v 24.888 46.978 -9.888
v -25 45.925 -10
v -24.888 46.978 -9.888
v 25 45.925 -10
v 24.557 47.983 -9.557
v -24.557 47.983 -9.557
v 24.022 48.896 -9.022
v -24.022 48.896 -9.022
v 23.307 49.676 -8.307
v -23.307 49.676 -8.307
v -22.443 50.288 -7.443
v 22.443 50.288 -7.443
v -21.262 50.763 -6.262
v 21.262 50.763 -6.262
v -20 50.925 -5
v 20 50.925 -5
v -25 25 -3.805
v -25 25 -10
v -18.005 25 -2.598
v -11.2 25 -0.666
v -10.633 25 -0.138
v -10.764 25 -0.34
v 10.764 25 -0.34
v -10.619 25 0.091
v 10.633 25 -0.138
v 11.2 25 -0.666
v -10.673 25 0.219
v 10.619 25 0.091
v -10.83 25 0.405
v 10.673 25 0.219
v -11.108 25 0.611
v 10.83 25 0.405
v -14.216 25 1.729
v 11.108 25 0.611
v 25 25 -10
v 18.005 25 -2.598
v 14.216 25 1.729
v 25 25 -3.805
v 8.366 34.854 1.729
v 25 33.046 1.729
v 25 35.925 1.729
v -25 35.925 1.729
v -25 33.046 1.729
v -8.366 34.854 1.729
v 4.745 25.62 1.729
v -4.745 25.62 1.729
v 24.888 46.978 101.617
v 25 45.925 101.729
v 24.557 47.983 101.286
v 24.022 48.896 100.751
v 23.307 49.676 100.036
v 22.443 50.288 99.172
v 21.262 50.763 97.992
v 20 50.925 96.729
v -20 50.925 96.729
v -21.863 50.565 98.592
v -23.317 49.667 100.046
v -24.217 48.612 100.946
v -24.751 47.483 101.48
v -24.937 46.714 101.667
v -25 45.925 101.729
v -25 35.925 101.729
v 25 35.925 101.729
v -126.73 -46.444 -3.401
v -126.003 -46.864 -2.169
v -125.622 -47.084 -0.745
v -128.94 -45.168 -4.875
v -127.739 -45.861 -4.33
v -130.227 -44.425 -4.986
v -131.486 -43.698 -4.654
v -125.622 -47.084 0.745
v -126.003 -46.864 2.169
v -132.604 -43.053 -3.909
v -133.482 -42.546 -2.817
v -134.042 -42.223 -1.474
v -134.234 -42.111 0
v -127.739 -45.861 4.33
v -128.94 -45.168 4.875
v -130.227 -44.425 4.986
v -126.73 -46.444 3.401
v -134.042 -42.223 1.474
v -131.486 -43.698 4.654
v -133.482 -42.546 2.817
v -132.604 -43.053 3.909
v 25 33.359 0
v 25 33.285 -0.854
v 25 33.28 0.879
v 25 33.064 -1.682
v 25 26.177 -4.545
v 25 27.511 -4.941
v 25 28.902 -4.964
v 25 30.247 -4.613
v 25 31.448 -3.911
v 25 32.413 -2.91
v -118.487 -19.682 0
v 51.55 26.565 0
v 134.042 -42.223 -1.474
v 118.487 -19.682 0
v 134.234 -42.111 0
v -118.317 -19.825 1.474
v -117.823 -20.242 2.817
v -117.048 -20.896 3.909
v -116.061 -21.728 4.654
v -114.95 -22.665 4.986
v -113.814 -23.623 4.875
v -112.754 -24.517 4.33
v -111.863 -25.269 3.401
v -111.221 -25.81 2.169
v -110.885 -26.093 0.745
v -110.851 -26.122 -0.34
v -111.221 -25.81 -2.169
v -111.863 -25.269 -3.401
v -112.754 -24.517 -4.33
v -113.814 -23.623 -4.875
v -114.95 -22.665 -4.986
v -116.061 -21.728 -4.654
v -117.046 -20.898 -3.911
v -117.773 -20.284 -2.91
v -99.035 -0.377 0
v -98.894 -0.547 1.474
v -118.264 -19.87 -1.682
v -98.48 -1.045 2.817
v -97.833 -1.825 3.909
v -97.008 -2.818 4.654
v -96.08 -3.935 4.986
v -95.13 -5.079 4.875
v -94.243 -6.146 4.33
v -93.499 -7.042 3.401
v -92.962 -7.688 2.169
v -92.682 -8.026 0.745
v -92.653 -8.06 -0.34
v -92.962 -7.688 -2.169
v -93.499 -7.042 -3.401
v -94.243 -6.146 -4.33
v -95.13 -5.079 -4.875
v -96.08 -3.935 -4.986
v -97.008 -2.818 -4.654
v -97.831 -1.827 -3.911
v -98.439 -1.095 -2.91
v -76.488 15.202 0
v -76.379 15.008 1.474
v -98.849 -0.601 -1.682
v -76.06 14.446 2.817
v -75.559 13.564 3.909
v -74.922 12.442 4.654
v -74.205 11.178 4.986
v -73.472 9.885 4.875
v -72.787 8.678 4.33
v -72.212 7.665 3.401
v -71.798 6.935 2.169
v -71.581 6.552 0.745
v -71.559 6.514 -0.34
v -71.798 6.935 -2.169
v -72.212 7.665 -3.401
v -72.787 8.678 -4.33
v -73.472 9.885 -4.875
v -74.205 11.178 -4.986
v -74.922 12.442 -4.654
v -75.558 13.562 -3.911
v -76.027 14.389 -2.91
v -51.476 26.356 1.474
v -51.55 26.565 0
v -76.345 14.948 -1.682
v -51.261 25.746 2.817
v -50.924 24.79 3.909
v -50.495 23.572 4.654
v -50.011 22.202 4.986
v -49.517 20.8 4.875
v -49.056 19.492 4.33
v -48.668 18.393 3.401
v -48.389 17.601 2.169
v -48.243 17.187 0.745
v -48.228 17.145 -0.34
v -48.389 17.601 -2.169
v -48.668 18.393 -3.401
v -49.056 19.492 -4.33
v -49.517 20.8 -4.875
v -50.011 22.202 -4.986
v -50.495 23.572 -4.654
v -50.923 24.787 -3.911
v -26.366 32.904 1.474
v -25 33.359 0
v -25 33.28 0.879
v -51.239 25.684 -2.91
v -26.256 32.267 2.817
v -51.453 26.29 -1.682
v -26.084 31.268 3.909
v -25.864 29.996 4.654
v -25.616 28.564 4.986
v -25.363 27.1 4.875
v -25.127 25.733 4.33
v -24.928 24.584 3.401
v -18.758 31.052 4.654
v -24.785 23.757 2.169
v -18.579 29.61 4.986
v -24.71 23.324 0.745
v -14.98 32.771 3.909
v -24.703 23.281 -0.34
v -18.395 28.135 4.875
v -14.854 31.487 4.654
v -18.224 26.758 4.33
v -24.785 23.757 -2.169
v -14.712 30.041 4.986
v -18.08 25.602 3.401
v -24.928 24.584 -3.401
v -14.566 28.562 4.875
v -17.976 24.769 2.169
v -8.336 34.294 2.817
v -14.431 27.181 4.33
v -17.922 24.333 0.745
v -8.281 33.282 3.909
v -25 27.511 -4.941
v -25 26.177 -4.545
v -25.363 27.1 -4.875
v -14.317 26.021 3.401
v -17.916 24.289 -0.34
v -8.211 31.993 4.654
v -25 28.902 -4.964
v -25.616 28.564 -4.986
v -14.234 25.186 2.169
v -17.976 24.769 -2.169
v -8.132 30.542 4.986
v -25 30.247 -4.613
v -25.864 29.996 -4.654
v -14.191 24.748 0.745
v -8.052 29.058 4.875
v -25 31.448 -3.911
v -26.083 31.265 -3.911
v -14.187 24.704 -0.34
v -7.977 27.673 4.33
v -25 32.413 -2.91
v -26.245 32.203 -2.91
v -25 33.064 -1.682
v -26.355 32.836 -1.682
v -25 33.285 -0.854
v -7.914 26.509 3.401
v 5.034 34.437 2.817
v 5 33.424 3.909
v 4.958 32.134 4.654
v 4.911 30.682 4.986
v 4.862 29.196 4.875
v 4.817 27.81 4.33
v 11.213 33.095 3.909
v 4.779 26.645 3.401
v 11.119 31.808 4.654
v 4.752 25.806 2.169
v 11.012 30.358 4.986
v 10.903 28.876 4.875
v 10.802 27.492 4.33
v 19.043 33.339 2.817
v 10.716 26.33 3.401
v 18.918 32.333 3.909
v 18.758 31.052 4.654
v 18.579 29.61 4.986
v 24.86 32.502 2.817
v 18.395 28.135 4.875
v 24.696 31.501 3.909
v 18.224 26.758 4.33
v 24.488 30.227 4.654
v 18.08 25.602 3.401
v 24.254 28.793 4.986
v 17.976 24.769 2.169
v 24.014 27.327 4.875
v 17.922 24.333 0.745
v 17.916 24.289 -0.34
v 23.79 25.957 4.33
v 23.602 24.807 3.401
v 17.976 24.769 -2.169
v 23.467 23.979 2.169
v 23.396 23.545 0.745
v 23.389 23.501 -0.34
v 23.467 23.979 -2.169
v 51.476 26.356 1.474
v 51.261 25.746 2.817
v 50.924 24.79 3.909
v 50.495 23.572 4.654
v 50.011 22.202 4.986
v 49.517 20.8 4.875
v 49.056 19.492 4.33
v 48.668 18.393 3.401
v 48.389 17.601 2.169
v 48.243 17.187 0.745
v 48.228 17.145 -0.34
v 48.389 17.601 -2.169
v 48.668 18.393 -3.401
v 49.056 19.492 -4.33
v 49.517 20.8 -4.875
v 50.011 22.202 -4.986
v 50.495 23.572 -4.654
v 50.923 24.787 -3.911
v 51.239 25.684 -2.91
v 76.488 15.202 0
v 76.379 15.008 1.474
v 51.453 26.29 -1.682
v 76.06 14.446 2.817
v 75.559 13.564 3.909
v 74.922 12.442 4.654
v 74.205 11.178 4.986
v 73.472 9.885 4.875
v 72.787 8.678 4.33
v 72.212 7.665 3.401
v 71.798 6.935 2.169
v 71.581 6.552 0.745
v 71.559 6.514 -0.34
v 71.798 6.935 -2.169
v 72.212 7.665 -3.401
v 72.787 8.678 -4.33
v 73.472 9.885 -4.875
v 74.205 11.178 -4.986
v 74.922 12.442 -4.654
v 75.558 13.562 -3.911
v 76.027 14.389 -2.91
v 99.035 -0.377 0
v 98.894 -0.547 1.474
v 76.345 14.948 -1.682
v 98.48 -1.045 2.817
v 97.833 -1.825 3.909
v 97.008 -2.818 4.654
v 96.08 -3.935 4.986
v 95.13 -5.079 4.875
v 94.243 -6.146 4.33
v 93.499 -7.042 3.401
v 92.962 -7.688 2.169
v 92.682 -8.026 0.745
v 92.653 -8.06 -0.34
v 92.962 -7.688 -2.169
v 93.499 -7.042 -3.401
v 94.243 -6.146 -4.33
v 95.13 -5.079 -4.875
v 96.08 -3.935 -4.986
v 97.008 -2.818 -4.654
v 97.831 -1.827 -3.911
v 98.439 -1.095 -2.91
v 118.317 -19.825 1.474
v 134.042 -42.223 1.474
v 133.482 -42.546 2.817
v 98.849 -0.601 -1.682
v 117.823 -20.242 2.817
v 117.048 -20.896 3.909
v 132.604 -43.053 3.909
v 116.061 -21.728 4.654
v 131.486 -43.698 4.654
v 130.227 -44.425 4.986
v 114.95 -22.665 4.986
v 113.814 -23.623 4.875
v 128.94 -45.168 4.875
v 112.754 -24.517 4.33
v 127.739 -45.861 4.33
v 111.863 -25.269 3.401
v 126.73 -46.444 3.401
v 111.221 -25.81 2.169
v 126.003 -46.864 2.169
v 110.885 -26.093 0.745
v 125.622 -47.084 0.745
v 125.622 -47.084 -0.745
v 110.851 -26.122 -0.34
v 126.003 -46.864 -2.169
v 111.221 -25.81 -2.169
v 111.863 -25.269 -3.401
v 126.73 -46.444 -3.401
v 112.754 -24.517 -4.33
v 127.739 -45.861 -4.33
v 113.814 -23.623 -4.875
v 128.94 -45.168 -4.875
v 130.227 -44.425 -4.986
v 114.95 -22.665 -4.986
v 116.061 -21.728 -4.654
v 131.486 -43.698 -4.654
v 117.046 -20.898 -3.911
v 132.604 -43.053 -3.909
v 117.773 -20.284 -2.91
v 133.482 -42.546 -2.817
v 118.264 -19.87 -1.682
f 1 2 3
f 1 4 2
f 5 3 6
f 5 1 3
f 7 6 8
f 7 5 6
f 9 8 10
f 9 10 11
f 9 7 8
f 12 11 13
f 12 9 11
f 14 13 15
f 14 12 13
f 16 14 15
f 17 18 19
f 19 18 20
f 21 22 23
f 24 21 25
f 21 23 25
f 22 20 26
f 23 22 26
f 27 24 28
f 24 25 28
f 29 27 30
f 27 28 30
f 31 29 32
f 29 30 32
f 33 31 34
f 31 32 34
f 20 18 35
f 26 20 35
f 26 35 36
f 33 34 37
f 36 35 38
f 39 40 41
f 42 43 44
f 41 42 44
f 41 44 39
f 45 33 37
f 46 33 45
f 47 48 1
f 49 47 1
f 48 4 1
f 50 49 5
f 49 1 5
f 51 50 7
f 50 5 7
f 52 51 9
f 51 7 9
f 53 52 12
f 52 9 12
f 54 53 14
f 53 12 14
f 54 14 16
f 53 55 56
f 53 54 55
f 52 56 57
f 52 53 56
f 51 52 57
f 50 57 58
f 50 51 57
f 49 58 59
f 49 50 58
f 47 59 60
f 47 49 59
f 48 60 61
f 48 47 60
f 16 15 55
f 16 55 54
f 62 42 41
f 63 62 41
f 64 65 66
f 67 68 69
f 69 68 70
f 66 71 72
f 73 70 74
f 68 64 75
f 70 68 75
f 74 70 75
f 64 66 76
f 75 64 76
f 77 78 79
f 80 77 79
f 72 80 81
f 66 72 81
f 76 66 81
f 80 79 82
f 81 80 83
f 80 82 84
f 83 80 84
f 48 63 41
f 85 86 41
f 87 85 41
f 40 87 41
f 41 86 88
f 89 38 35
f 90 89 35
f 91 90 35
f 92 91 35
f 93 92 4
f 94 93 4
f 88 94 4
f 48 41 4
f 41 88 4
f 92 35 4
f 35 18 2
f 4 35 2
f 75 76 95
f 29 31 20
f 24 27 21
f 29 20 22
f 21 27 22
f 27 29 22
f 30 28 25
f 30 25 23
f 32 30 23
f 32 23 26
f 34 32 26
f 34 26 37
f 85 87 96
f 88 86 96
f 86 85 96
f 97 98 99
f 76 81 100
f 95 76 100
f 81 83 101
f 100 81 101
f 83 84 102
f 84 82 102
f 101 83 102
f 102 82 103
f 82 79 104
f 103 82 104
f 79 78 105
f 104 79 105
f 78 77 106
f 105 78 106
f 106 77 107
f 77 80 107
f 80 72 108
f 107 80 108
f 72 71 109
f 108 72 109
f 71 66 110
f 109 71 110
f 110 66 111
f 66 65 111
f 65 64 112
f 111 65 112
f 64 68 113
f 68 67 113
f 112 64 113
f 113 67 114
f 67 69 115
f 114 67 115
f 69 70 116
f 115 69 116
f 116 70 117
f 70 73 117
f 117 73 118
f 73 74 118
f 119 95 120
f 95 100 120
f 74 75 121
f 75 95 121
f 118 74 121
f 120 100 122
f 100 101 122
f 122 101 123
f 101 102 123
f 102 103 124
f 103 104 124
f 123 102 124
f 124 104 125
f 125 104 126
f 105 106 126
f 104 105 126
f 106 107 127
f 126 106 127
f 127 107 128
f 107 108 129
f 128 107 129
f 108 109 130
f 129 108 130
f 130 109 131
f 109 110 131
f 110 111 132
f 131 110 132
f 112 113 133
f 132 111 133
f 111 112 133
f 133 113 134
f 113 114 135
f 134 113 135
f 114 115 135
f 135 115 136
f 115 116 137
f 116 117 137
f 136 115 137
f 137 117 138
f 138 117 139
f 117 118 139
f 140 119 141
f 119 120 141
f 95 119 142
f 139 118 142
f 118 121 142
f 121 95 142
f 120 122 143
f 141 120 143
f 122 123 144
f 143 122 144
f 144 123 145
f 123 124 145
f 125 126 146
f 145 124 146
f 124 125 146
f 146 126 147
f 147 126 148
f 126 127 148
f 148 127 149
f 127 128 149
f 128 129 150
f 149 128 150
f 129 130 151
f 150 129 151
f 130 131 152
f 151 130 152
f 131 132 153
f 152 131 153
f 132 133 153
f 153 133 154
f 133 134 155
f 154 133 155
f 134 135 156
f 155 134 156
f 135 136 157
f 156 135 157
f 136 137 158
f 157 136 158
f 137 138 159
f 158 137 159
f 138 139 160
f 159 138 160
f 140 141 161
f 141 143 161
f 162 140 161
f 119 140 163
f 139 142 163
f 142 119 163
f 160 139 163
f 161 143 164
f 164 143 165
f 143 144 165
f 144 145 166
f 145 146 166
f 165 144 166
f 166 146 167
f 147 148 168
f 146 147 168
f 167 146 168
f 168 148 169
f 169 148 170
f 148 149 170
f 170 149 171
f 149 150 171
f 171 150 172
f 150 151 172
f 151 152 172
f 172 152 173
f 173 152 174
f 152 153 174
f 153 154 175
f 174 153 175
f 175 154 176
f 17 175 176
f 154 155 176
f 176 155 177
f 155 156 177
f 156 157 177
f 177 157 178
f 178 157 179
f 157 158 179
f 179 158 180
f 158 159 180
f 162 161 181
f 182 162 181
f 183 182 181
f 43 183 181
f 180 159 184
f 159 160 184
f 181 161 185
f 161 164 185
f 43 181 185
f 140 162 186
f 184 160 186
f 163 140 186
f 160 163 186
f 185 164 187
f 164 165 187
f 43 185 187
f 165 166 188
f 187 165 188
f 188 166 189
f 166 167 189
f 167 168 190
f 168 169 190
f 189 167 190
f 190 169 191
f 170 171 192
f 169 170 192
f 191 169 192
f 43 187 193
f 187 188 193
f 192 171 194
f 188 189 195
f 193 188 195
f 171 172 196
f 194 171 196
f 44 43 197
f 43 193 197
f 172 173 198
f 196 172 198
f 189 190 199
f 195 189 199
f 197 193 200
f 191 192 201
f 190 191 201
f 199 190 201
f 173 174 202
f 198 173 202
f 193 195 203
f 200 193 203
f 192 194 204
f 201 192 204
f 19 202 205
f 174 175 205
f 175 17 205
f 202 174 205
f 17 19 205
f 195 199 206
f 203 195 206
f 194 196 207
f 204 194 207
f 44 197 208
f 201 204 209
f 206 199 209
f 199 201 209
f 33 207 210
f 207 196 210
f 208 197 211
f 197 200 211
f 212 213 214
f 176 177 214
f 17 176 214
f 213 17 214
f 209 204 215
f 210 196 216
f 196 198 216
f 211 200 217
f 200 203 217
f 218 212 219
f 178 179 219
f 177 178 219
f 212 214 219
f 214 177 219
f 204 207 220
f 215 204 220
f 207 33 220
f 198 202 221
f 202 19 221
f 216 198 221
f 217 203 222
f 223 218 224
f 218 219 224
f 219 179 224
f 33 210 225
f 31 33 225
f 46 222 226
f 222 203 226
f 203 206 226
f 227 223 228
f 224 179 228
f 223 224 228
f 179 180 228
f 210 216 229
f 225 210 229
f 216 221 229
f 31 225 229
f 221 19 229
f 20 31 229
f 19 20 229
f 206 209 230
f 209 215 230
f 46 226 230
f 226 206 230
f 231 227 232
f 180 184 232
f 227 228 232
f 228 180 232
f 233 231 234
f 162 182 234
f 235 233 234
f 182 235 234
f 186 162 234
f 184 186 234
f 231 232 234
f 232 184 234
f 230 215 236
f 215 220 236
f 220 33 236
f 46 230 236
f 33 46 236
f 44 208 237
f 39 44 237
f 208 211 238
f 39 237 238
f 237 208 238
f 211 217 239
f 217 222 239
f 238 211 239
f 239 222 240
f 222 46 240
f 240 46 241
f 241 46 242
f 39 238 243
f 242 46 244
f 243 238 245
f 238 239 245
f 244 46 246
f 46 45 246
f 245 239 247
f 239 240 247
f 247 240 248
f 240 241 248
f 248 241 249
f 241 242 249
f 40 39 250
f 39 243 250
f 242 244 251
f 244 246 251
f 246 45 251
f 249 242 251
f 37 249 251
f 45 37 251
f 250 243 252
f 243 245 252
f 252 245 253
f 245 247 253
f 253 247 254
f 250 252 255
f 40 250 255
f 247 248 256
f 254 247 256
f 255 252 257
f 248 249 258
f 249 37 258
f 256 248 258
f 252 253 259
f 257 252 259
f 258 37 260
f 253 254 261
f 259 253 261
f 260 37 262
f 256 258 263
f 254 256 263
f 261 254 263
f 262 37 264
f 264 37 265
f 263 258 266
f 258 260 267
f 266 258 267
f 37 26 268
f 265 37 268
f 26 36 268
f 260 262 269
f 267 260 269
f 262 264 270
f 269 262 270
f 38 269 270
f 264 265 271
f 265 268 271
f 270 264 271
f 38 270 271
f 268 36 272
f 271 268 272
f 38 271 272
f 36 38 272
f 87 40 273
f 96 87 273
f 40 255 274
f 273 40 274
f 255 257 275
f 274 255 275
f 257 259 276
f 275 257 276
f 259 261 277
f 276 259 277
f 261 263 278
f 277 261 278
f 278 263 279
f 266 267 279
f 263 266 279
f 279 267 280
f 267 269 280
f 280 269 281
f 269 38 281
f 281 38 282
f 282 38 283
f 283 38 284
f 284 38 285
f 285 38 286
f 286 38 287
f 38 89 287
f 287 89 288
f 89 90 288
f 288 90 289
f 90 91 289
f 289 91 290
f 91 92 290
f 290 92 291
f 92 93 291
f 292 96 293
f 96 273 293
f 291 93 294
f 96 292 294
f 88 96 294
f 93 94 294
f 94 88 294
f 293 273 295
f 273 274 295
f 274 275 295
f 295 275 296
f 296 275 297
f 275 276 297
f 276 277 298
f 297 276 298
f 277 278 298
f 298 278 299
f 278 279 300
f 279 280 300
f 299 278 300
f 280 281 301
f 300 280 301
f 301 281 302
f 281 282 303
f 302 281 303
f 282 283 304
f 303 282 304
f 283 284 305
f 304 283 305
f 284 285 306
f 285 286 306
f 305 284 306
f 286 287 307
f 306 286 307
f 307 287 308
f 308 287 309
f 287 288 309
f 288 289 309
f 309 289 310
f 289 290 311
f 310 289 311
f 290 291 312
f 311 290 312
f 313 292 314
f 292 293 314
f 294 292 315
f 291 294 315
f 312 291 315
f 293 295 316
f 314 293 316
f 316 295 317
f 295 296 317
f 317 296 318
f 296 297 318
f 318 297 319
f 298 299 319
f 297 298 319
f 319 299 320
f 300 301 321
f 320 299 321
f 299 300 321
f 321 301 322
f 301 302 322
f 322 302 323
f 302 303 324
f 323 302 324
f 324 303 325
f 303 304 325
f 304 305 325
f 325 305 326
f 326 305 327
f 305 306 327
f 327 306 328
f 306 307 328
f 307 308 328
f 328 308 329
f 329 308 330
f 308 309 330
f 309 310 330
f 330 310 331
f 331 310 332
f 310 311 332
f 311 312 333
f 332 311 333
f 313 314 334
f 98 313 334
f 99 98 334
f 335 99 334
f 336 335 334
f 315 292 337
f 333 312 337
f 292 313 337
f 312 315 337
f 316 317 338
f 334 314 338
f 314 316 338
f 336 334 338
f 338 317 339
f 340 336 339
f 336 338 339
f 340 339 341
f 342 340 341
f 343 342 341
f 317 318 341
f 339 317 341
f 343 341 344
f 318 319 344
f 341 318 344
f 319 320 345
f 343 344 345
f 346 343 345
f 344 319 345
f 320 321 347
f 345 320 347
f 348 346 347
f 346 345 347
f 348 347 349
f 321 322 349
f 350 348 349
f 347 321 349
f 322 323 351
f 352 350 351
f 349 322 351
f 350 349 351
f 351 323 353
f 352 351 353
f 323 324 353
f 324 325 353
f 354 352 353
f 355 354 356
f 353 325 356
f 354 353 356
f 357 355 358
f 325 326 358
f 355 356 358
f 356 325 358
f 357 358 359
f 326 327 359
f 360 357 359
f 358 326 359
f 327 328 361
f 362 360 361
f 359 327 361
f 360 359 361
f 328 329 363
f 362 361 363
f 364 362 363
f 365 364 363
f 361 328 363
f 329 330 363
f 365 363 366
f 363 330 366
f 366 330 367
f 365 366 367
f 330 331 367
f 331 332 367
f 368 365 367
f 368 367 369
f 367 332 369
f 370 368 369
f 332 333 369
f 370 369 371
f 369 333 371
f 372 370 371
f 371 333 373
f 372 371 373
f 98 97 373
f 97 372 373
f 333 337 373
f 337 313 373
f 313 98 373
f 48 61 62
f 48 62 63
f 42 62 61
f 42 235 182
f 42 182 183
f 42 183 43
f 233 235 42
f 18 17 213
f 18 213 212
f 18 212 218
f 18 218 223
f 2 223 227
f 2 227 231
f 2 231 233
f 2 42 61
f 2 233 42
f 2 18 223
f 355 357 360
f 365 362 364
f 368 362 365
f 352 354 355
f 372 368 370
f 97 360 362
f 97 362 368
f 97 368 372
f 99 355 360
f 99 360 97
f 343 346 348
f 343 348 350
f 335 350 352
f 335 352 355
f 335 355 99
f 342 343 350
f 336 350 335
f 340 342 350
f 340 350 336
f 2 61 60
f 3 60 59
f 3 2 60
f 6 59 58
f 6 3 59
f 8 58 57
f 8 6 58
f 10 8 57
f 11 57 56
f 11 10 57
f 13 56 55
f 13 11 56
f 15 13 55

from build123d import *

# Parameters (mm, degrees)
F0_R          = 5
F1_ANGLE_BACK = 60
F1_ANGLE      = 120
F2_W          = 25.9252840082
F2_H          = 11.7293265872
F3_DEPTH      = 25
F3_DEPTH_BACK = 25
F4_W          = 50
F4_H          = 15
F5_DEPTH      = 100
F6_R          = 5


# Not quite as in the source:
# - a feature of the source that left no trace in its solid (it failed there, or was rolled back) is left out


with BuildPart() as f1:
    # F0 (on Right) → F1 (revolve)
    with BuildSketch(Plane.YZ, mode=Mode.PRIVATE) as f1_sk:
        with Locations((30.3885055535, 0)):
            Circle(F0_R)
    revolve(f1_sk.sketch.rotate(Axis((0, -119.6114944465, -16.3725827584), (0, 0, -1)), -F1_ANGLE_BACK), axis=Axis((0, -119.6114944465, -16.3725827584), (0, 0, -1)), revolution_arc=F1_ANGLE)

    # F2 (on Right) → F3 (join, two sides)
    with BuildSketch(Plane.YZ) as f3_sk:
        with Locations((37.9626420041, -4.1353367064)):
            Rectangle(F2_W, F2_H)
    extrude(amount=F3_DEPTH)
    extrude(f3_sk.sketch, amount=-F3_DEPTH_BACK)

    # F4 (on face) → F5 (join)
    with BuildSketch(Plane.XY.offset(1.7293265872)):
        with Locations((0, 43.4252840082)):
            Rectangle(F4_W, F4_H)
    extrude(amount=F5_DEPTH)

    # F6
    f6_edges = [f1.edges().sort_by_distance(p)[0] for p in [
        (0, 50.925284, -10),
        (25, 50.925284, 45.864663),
        (0, 50.925284, 101.729327),
        (-25, 50.925284, 45.864663),
    ]]
    fillet(f6_edges, radius=F6_R)


solid = f1.part
